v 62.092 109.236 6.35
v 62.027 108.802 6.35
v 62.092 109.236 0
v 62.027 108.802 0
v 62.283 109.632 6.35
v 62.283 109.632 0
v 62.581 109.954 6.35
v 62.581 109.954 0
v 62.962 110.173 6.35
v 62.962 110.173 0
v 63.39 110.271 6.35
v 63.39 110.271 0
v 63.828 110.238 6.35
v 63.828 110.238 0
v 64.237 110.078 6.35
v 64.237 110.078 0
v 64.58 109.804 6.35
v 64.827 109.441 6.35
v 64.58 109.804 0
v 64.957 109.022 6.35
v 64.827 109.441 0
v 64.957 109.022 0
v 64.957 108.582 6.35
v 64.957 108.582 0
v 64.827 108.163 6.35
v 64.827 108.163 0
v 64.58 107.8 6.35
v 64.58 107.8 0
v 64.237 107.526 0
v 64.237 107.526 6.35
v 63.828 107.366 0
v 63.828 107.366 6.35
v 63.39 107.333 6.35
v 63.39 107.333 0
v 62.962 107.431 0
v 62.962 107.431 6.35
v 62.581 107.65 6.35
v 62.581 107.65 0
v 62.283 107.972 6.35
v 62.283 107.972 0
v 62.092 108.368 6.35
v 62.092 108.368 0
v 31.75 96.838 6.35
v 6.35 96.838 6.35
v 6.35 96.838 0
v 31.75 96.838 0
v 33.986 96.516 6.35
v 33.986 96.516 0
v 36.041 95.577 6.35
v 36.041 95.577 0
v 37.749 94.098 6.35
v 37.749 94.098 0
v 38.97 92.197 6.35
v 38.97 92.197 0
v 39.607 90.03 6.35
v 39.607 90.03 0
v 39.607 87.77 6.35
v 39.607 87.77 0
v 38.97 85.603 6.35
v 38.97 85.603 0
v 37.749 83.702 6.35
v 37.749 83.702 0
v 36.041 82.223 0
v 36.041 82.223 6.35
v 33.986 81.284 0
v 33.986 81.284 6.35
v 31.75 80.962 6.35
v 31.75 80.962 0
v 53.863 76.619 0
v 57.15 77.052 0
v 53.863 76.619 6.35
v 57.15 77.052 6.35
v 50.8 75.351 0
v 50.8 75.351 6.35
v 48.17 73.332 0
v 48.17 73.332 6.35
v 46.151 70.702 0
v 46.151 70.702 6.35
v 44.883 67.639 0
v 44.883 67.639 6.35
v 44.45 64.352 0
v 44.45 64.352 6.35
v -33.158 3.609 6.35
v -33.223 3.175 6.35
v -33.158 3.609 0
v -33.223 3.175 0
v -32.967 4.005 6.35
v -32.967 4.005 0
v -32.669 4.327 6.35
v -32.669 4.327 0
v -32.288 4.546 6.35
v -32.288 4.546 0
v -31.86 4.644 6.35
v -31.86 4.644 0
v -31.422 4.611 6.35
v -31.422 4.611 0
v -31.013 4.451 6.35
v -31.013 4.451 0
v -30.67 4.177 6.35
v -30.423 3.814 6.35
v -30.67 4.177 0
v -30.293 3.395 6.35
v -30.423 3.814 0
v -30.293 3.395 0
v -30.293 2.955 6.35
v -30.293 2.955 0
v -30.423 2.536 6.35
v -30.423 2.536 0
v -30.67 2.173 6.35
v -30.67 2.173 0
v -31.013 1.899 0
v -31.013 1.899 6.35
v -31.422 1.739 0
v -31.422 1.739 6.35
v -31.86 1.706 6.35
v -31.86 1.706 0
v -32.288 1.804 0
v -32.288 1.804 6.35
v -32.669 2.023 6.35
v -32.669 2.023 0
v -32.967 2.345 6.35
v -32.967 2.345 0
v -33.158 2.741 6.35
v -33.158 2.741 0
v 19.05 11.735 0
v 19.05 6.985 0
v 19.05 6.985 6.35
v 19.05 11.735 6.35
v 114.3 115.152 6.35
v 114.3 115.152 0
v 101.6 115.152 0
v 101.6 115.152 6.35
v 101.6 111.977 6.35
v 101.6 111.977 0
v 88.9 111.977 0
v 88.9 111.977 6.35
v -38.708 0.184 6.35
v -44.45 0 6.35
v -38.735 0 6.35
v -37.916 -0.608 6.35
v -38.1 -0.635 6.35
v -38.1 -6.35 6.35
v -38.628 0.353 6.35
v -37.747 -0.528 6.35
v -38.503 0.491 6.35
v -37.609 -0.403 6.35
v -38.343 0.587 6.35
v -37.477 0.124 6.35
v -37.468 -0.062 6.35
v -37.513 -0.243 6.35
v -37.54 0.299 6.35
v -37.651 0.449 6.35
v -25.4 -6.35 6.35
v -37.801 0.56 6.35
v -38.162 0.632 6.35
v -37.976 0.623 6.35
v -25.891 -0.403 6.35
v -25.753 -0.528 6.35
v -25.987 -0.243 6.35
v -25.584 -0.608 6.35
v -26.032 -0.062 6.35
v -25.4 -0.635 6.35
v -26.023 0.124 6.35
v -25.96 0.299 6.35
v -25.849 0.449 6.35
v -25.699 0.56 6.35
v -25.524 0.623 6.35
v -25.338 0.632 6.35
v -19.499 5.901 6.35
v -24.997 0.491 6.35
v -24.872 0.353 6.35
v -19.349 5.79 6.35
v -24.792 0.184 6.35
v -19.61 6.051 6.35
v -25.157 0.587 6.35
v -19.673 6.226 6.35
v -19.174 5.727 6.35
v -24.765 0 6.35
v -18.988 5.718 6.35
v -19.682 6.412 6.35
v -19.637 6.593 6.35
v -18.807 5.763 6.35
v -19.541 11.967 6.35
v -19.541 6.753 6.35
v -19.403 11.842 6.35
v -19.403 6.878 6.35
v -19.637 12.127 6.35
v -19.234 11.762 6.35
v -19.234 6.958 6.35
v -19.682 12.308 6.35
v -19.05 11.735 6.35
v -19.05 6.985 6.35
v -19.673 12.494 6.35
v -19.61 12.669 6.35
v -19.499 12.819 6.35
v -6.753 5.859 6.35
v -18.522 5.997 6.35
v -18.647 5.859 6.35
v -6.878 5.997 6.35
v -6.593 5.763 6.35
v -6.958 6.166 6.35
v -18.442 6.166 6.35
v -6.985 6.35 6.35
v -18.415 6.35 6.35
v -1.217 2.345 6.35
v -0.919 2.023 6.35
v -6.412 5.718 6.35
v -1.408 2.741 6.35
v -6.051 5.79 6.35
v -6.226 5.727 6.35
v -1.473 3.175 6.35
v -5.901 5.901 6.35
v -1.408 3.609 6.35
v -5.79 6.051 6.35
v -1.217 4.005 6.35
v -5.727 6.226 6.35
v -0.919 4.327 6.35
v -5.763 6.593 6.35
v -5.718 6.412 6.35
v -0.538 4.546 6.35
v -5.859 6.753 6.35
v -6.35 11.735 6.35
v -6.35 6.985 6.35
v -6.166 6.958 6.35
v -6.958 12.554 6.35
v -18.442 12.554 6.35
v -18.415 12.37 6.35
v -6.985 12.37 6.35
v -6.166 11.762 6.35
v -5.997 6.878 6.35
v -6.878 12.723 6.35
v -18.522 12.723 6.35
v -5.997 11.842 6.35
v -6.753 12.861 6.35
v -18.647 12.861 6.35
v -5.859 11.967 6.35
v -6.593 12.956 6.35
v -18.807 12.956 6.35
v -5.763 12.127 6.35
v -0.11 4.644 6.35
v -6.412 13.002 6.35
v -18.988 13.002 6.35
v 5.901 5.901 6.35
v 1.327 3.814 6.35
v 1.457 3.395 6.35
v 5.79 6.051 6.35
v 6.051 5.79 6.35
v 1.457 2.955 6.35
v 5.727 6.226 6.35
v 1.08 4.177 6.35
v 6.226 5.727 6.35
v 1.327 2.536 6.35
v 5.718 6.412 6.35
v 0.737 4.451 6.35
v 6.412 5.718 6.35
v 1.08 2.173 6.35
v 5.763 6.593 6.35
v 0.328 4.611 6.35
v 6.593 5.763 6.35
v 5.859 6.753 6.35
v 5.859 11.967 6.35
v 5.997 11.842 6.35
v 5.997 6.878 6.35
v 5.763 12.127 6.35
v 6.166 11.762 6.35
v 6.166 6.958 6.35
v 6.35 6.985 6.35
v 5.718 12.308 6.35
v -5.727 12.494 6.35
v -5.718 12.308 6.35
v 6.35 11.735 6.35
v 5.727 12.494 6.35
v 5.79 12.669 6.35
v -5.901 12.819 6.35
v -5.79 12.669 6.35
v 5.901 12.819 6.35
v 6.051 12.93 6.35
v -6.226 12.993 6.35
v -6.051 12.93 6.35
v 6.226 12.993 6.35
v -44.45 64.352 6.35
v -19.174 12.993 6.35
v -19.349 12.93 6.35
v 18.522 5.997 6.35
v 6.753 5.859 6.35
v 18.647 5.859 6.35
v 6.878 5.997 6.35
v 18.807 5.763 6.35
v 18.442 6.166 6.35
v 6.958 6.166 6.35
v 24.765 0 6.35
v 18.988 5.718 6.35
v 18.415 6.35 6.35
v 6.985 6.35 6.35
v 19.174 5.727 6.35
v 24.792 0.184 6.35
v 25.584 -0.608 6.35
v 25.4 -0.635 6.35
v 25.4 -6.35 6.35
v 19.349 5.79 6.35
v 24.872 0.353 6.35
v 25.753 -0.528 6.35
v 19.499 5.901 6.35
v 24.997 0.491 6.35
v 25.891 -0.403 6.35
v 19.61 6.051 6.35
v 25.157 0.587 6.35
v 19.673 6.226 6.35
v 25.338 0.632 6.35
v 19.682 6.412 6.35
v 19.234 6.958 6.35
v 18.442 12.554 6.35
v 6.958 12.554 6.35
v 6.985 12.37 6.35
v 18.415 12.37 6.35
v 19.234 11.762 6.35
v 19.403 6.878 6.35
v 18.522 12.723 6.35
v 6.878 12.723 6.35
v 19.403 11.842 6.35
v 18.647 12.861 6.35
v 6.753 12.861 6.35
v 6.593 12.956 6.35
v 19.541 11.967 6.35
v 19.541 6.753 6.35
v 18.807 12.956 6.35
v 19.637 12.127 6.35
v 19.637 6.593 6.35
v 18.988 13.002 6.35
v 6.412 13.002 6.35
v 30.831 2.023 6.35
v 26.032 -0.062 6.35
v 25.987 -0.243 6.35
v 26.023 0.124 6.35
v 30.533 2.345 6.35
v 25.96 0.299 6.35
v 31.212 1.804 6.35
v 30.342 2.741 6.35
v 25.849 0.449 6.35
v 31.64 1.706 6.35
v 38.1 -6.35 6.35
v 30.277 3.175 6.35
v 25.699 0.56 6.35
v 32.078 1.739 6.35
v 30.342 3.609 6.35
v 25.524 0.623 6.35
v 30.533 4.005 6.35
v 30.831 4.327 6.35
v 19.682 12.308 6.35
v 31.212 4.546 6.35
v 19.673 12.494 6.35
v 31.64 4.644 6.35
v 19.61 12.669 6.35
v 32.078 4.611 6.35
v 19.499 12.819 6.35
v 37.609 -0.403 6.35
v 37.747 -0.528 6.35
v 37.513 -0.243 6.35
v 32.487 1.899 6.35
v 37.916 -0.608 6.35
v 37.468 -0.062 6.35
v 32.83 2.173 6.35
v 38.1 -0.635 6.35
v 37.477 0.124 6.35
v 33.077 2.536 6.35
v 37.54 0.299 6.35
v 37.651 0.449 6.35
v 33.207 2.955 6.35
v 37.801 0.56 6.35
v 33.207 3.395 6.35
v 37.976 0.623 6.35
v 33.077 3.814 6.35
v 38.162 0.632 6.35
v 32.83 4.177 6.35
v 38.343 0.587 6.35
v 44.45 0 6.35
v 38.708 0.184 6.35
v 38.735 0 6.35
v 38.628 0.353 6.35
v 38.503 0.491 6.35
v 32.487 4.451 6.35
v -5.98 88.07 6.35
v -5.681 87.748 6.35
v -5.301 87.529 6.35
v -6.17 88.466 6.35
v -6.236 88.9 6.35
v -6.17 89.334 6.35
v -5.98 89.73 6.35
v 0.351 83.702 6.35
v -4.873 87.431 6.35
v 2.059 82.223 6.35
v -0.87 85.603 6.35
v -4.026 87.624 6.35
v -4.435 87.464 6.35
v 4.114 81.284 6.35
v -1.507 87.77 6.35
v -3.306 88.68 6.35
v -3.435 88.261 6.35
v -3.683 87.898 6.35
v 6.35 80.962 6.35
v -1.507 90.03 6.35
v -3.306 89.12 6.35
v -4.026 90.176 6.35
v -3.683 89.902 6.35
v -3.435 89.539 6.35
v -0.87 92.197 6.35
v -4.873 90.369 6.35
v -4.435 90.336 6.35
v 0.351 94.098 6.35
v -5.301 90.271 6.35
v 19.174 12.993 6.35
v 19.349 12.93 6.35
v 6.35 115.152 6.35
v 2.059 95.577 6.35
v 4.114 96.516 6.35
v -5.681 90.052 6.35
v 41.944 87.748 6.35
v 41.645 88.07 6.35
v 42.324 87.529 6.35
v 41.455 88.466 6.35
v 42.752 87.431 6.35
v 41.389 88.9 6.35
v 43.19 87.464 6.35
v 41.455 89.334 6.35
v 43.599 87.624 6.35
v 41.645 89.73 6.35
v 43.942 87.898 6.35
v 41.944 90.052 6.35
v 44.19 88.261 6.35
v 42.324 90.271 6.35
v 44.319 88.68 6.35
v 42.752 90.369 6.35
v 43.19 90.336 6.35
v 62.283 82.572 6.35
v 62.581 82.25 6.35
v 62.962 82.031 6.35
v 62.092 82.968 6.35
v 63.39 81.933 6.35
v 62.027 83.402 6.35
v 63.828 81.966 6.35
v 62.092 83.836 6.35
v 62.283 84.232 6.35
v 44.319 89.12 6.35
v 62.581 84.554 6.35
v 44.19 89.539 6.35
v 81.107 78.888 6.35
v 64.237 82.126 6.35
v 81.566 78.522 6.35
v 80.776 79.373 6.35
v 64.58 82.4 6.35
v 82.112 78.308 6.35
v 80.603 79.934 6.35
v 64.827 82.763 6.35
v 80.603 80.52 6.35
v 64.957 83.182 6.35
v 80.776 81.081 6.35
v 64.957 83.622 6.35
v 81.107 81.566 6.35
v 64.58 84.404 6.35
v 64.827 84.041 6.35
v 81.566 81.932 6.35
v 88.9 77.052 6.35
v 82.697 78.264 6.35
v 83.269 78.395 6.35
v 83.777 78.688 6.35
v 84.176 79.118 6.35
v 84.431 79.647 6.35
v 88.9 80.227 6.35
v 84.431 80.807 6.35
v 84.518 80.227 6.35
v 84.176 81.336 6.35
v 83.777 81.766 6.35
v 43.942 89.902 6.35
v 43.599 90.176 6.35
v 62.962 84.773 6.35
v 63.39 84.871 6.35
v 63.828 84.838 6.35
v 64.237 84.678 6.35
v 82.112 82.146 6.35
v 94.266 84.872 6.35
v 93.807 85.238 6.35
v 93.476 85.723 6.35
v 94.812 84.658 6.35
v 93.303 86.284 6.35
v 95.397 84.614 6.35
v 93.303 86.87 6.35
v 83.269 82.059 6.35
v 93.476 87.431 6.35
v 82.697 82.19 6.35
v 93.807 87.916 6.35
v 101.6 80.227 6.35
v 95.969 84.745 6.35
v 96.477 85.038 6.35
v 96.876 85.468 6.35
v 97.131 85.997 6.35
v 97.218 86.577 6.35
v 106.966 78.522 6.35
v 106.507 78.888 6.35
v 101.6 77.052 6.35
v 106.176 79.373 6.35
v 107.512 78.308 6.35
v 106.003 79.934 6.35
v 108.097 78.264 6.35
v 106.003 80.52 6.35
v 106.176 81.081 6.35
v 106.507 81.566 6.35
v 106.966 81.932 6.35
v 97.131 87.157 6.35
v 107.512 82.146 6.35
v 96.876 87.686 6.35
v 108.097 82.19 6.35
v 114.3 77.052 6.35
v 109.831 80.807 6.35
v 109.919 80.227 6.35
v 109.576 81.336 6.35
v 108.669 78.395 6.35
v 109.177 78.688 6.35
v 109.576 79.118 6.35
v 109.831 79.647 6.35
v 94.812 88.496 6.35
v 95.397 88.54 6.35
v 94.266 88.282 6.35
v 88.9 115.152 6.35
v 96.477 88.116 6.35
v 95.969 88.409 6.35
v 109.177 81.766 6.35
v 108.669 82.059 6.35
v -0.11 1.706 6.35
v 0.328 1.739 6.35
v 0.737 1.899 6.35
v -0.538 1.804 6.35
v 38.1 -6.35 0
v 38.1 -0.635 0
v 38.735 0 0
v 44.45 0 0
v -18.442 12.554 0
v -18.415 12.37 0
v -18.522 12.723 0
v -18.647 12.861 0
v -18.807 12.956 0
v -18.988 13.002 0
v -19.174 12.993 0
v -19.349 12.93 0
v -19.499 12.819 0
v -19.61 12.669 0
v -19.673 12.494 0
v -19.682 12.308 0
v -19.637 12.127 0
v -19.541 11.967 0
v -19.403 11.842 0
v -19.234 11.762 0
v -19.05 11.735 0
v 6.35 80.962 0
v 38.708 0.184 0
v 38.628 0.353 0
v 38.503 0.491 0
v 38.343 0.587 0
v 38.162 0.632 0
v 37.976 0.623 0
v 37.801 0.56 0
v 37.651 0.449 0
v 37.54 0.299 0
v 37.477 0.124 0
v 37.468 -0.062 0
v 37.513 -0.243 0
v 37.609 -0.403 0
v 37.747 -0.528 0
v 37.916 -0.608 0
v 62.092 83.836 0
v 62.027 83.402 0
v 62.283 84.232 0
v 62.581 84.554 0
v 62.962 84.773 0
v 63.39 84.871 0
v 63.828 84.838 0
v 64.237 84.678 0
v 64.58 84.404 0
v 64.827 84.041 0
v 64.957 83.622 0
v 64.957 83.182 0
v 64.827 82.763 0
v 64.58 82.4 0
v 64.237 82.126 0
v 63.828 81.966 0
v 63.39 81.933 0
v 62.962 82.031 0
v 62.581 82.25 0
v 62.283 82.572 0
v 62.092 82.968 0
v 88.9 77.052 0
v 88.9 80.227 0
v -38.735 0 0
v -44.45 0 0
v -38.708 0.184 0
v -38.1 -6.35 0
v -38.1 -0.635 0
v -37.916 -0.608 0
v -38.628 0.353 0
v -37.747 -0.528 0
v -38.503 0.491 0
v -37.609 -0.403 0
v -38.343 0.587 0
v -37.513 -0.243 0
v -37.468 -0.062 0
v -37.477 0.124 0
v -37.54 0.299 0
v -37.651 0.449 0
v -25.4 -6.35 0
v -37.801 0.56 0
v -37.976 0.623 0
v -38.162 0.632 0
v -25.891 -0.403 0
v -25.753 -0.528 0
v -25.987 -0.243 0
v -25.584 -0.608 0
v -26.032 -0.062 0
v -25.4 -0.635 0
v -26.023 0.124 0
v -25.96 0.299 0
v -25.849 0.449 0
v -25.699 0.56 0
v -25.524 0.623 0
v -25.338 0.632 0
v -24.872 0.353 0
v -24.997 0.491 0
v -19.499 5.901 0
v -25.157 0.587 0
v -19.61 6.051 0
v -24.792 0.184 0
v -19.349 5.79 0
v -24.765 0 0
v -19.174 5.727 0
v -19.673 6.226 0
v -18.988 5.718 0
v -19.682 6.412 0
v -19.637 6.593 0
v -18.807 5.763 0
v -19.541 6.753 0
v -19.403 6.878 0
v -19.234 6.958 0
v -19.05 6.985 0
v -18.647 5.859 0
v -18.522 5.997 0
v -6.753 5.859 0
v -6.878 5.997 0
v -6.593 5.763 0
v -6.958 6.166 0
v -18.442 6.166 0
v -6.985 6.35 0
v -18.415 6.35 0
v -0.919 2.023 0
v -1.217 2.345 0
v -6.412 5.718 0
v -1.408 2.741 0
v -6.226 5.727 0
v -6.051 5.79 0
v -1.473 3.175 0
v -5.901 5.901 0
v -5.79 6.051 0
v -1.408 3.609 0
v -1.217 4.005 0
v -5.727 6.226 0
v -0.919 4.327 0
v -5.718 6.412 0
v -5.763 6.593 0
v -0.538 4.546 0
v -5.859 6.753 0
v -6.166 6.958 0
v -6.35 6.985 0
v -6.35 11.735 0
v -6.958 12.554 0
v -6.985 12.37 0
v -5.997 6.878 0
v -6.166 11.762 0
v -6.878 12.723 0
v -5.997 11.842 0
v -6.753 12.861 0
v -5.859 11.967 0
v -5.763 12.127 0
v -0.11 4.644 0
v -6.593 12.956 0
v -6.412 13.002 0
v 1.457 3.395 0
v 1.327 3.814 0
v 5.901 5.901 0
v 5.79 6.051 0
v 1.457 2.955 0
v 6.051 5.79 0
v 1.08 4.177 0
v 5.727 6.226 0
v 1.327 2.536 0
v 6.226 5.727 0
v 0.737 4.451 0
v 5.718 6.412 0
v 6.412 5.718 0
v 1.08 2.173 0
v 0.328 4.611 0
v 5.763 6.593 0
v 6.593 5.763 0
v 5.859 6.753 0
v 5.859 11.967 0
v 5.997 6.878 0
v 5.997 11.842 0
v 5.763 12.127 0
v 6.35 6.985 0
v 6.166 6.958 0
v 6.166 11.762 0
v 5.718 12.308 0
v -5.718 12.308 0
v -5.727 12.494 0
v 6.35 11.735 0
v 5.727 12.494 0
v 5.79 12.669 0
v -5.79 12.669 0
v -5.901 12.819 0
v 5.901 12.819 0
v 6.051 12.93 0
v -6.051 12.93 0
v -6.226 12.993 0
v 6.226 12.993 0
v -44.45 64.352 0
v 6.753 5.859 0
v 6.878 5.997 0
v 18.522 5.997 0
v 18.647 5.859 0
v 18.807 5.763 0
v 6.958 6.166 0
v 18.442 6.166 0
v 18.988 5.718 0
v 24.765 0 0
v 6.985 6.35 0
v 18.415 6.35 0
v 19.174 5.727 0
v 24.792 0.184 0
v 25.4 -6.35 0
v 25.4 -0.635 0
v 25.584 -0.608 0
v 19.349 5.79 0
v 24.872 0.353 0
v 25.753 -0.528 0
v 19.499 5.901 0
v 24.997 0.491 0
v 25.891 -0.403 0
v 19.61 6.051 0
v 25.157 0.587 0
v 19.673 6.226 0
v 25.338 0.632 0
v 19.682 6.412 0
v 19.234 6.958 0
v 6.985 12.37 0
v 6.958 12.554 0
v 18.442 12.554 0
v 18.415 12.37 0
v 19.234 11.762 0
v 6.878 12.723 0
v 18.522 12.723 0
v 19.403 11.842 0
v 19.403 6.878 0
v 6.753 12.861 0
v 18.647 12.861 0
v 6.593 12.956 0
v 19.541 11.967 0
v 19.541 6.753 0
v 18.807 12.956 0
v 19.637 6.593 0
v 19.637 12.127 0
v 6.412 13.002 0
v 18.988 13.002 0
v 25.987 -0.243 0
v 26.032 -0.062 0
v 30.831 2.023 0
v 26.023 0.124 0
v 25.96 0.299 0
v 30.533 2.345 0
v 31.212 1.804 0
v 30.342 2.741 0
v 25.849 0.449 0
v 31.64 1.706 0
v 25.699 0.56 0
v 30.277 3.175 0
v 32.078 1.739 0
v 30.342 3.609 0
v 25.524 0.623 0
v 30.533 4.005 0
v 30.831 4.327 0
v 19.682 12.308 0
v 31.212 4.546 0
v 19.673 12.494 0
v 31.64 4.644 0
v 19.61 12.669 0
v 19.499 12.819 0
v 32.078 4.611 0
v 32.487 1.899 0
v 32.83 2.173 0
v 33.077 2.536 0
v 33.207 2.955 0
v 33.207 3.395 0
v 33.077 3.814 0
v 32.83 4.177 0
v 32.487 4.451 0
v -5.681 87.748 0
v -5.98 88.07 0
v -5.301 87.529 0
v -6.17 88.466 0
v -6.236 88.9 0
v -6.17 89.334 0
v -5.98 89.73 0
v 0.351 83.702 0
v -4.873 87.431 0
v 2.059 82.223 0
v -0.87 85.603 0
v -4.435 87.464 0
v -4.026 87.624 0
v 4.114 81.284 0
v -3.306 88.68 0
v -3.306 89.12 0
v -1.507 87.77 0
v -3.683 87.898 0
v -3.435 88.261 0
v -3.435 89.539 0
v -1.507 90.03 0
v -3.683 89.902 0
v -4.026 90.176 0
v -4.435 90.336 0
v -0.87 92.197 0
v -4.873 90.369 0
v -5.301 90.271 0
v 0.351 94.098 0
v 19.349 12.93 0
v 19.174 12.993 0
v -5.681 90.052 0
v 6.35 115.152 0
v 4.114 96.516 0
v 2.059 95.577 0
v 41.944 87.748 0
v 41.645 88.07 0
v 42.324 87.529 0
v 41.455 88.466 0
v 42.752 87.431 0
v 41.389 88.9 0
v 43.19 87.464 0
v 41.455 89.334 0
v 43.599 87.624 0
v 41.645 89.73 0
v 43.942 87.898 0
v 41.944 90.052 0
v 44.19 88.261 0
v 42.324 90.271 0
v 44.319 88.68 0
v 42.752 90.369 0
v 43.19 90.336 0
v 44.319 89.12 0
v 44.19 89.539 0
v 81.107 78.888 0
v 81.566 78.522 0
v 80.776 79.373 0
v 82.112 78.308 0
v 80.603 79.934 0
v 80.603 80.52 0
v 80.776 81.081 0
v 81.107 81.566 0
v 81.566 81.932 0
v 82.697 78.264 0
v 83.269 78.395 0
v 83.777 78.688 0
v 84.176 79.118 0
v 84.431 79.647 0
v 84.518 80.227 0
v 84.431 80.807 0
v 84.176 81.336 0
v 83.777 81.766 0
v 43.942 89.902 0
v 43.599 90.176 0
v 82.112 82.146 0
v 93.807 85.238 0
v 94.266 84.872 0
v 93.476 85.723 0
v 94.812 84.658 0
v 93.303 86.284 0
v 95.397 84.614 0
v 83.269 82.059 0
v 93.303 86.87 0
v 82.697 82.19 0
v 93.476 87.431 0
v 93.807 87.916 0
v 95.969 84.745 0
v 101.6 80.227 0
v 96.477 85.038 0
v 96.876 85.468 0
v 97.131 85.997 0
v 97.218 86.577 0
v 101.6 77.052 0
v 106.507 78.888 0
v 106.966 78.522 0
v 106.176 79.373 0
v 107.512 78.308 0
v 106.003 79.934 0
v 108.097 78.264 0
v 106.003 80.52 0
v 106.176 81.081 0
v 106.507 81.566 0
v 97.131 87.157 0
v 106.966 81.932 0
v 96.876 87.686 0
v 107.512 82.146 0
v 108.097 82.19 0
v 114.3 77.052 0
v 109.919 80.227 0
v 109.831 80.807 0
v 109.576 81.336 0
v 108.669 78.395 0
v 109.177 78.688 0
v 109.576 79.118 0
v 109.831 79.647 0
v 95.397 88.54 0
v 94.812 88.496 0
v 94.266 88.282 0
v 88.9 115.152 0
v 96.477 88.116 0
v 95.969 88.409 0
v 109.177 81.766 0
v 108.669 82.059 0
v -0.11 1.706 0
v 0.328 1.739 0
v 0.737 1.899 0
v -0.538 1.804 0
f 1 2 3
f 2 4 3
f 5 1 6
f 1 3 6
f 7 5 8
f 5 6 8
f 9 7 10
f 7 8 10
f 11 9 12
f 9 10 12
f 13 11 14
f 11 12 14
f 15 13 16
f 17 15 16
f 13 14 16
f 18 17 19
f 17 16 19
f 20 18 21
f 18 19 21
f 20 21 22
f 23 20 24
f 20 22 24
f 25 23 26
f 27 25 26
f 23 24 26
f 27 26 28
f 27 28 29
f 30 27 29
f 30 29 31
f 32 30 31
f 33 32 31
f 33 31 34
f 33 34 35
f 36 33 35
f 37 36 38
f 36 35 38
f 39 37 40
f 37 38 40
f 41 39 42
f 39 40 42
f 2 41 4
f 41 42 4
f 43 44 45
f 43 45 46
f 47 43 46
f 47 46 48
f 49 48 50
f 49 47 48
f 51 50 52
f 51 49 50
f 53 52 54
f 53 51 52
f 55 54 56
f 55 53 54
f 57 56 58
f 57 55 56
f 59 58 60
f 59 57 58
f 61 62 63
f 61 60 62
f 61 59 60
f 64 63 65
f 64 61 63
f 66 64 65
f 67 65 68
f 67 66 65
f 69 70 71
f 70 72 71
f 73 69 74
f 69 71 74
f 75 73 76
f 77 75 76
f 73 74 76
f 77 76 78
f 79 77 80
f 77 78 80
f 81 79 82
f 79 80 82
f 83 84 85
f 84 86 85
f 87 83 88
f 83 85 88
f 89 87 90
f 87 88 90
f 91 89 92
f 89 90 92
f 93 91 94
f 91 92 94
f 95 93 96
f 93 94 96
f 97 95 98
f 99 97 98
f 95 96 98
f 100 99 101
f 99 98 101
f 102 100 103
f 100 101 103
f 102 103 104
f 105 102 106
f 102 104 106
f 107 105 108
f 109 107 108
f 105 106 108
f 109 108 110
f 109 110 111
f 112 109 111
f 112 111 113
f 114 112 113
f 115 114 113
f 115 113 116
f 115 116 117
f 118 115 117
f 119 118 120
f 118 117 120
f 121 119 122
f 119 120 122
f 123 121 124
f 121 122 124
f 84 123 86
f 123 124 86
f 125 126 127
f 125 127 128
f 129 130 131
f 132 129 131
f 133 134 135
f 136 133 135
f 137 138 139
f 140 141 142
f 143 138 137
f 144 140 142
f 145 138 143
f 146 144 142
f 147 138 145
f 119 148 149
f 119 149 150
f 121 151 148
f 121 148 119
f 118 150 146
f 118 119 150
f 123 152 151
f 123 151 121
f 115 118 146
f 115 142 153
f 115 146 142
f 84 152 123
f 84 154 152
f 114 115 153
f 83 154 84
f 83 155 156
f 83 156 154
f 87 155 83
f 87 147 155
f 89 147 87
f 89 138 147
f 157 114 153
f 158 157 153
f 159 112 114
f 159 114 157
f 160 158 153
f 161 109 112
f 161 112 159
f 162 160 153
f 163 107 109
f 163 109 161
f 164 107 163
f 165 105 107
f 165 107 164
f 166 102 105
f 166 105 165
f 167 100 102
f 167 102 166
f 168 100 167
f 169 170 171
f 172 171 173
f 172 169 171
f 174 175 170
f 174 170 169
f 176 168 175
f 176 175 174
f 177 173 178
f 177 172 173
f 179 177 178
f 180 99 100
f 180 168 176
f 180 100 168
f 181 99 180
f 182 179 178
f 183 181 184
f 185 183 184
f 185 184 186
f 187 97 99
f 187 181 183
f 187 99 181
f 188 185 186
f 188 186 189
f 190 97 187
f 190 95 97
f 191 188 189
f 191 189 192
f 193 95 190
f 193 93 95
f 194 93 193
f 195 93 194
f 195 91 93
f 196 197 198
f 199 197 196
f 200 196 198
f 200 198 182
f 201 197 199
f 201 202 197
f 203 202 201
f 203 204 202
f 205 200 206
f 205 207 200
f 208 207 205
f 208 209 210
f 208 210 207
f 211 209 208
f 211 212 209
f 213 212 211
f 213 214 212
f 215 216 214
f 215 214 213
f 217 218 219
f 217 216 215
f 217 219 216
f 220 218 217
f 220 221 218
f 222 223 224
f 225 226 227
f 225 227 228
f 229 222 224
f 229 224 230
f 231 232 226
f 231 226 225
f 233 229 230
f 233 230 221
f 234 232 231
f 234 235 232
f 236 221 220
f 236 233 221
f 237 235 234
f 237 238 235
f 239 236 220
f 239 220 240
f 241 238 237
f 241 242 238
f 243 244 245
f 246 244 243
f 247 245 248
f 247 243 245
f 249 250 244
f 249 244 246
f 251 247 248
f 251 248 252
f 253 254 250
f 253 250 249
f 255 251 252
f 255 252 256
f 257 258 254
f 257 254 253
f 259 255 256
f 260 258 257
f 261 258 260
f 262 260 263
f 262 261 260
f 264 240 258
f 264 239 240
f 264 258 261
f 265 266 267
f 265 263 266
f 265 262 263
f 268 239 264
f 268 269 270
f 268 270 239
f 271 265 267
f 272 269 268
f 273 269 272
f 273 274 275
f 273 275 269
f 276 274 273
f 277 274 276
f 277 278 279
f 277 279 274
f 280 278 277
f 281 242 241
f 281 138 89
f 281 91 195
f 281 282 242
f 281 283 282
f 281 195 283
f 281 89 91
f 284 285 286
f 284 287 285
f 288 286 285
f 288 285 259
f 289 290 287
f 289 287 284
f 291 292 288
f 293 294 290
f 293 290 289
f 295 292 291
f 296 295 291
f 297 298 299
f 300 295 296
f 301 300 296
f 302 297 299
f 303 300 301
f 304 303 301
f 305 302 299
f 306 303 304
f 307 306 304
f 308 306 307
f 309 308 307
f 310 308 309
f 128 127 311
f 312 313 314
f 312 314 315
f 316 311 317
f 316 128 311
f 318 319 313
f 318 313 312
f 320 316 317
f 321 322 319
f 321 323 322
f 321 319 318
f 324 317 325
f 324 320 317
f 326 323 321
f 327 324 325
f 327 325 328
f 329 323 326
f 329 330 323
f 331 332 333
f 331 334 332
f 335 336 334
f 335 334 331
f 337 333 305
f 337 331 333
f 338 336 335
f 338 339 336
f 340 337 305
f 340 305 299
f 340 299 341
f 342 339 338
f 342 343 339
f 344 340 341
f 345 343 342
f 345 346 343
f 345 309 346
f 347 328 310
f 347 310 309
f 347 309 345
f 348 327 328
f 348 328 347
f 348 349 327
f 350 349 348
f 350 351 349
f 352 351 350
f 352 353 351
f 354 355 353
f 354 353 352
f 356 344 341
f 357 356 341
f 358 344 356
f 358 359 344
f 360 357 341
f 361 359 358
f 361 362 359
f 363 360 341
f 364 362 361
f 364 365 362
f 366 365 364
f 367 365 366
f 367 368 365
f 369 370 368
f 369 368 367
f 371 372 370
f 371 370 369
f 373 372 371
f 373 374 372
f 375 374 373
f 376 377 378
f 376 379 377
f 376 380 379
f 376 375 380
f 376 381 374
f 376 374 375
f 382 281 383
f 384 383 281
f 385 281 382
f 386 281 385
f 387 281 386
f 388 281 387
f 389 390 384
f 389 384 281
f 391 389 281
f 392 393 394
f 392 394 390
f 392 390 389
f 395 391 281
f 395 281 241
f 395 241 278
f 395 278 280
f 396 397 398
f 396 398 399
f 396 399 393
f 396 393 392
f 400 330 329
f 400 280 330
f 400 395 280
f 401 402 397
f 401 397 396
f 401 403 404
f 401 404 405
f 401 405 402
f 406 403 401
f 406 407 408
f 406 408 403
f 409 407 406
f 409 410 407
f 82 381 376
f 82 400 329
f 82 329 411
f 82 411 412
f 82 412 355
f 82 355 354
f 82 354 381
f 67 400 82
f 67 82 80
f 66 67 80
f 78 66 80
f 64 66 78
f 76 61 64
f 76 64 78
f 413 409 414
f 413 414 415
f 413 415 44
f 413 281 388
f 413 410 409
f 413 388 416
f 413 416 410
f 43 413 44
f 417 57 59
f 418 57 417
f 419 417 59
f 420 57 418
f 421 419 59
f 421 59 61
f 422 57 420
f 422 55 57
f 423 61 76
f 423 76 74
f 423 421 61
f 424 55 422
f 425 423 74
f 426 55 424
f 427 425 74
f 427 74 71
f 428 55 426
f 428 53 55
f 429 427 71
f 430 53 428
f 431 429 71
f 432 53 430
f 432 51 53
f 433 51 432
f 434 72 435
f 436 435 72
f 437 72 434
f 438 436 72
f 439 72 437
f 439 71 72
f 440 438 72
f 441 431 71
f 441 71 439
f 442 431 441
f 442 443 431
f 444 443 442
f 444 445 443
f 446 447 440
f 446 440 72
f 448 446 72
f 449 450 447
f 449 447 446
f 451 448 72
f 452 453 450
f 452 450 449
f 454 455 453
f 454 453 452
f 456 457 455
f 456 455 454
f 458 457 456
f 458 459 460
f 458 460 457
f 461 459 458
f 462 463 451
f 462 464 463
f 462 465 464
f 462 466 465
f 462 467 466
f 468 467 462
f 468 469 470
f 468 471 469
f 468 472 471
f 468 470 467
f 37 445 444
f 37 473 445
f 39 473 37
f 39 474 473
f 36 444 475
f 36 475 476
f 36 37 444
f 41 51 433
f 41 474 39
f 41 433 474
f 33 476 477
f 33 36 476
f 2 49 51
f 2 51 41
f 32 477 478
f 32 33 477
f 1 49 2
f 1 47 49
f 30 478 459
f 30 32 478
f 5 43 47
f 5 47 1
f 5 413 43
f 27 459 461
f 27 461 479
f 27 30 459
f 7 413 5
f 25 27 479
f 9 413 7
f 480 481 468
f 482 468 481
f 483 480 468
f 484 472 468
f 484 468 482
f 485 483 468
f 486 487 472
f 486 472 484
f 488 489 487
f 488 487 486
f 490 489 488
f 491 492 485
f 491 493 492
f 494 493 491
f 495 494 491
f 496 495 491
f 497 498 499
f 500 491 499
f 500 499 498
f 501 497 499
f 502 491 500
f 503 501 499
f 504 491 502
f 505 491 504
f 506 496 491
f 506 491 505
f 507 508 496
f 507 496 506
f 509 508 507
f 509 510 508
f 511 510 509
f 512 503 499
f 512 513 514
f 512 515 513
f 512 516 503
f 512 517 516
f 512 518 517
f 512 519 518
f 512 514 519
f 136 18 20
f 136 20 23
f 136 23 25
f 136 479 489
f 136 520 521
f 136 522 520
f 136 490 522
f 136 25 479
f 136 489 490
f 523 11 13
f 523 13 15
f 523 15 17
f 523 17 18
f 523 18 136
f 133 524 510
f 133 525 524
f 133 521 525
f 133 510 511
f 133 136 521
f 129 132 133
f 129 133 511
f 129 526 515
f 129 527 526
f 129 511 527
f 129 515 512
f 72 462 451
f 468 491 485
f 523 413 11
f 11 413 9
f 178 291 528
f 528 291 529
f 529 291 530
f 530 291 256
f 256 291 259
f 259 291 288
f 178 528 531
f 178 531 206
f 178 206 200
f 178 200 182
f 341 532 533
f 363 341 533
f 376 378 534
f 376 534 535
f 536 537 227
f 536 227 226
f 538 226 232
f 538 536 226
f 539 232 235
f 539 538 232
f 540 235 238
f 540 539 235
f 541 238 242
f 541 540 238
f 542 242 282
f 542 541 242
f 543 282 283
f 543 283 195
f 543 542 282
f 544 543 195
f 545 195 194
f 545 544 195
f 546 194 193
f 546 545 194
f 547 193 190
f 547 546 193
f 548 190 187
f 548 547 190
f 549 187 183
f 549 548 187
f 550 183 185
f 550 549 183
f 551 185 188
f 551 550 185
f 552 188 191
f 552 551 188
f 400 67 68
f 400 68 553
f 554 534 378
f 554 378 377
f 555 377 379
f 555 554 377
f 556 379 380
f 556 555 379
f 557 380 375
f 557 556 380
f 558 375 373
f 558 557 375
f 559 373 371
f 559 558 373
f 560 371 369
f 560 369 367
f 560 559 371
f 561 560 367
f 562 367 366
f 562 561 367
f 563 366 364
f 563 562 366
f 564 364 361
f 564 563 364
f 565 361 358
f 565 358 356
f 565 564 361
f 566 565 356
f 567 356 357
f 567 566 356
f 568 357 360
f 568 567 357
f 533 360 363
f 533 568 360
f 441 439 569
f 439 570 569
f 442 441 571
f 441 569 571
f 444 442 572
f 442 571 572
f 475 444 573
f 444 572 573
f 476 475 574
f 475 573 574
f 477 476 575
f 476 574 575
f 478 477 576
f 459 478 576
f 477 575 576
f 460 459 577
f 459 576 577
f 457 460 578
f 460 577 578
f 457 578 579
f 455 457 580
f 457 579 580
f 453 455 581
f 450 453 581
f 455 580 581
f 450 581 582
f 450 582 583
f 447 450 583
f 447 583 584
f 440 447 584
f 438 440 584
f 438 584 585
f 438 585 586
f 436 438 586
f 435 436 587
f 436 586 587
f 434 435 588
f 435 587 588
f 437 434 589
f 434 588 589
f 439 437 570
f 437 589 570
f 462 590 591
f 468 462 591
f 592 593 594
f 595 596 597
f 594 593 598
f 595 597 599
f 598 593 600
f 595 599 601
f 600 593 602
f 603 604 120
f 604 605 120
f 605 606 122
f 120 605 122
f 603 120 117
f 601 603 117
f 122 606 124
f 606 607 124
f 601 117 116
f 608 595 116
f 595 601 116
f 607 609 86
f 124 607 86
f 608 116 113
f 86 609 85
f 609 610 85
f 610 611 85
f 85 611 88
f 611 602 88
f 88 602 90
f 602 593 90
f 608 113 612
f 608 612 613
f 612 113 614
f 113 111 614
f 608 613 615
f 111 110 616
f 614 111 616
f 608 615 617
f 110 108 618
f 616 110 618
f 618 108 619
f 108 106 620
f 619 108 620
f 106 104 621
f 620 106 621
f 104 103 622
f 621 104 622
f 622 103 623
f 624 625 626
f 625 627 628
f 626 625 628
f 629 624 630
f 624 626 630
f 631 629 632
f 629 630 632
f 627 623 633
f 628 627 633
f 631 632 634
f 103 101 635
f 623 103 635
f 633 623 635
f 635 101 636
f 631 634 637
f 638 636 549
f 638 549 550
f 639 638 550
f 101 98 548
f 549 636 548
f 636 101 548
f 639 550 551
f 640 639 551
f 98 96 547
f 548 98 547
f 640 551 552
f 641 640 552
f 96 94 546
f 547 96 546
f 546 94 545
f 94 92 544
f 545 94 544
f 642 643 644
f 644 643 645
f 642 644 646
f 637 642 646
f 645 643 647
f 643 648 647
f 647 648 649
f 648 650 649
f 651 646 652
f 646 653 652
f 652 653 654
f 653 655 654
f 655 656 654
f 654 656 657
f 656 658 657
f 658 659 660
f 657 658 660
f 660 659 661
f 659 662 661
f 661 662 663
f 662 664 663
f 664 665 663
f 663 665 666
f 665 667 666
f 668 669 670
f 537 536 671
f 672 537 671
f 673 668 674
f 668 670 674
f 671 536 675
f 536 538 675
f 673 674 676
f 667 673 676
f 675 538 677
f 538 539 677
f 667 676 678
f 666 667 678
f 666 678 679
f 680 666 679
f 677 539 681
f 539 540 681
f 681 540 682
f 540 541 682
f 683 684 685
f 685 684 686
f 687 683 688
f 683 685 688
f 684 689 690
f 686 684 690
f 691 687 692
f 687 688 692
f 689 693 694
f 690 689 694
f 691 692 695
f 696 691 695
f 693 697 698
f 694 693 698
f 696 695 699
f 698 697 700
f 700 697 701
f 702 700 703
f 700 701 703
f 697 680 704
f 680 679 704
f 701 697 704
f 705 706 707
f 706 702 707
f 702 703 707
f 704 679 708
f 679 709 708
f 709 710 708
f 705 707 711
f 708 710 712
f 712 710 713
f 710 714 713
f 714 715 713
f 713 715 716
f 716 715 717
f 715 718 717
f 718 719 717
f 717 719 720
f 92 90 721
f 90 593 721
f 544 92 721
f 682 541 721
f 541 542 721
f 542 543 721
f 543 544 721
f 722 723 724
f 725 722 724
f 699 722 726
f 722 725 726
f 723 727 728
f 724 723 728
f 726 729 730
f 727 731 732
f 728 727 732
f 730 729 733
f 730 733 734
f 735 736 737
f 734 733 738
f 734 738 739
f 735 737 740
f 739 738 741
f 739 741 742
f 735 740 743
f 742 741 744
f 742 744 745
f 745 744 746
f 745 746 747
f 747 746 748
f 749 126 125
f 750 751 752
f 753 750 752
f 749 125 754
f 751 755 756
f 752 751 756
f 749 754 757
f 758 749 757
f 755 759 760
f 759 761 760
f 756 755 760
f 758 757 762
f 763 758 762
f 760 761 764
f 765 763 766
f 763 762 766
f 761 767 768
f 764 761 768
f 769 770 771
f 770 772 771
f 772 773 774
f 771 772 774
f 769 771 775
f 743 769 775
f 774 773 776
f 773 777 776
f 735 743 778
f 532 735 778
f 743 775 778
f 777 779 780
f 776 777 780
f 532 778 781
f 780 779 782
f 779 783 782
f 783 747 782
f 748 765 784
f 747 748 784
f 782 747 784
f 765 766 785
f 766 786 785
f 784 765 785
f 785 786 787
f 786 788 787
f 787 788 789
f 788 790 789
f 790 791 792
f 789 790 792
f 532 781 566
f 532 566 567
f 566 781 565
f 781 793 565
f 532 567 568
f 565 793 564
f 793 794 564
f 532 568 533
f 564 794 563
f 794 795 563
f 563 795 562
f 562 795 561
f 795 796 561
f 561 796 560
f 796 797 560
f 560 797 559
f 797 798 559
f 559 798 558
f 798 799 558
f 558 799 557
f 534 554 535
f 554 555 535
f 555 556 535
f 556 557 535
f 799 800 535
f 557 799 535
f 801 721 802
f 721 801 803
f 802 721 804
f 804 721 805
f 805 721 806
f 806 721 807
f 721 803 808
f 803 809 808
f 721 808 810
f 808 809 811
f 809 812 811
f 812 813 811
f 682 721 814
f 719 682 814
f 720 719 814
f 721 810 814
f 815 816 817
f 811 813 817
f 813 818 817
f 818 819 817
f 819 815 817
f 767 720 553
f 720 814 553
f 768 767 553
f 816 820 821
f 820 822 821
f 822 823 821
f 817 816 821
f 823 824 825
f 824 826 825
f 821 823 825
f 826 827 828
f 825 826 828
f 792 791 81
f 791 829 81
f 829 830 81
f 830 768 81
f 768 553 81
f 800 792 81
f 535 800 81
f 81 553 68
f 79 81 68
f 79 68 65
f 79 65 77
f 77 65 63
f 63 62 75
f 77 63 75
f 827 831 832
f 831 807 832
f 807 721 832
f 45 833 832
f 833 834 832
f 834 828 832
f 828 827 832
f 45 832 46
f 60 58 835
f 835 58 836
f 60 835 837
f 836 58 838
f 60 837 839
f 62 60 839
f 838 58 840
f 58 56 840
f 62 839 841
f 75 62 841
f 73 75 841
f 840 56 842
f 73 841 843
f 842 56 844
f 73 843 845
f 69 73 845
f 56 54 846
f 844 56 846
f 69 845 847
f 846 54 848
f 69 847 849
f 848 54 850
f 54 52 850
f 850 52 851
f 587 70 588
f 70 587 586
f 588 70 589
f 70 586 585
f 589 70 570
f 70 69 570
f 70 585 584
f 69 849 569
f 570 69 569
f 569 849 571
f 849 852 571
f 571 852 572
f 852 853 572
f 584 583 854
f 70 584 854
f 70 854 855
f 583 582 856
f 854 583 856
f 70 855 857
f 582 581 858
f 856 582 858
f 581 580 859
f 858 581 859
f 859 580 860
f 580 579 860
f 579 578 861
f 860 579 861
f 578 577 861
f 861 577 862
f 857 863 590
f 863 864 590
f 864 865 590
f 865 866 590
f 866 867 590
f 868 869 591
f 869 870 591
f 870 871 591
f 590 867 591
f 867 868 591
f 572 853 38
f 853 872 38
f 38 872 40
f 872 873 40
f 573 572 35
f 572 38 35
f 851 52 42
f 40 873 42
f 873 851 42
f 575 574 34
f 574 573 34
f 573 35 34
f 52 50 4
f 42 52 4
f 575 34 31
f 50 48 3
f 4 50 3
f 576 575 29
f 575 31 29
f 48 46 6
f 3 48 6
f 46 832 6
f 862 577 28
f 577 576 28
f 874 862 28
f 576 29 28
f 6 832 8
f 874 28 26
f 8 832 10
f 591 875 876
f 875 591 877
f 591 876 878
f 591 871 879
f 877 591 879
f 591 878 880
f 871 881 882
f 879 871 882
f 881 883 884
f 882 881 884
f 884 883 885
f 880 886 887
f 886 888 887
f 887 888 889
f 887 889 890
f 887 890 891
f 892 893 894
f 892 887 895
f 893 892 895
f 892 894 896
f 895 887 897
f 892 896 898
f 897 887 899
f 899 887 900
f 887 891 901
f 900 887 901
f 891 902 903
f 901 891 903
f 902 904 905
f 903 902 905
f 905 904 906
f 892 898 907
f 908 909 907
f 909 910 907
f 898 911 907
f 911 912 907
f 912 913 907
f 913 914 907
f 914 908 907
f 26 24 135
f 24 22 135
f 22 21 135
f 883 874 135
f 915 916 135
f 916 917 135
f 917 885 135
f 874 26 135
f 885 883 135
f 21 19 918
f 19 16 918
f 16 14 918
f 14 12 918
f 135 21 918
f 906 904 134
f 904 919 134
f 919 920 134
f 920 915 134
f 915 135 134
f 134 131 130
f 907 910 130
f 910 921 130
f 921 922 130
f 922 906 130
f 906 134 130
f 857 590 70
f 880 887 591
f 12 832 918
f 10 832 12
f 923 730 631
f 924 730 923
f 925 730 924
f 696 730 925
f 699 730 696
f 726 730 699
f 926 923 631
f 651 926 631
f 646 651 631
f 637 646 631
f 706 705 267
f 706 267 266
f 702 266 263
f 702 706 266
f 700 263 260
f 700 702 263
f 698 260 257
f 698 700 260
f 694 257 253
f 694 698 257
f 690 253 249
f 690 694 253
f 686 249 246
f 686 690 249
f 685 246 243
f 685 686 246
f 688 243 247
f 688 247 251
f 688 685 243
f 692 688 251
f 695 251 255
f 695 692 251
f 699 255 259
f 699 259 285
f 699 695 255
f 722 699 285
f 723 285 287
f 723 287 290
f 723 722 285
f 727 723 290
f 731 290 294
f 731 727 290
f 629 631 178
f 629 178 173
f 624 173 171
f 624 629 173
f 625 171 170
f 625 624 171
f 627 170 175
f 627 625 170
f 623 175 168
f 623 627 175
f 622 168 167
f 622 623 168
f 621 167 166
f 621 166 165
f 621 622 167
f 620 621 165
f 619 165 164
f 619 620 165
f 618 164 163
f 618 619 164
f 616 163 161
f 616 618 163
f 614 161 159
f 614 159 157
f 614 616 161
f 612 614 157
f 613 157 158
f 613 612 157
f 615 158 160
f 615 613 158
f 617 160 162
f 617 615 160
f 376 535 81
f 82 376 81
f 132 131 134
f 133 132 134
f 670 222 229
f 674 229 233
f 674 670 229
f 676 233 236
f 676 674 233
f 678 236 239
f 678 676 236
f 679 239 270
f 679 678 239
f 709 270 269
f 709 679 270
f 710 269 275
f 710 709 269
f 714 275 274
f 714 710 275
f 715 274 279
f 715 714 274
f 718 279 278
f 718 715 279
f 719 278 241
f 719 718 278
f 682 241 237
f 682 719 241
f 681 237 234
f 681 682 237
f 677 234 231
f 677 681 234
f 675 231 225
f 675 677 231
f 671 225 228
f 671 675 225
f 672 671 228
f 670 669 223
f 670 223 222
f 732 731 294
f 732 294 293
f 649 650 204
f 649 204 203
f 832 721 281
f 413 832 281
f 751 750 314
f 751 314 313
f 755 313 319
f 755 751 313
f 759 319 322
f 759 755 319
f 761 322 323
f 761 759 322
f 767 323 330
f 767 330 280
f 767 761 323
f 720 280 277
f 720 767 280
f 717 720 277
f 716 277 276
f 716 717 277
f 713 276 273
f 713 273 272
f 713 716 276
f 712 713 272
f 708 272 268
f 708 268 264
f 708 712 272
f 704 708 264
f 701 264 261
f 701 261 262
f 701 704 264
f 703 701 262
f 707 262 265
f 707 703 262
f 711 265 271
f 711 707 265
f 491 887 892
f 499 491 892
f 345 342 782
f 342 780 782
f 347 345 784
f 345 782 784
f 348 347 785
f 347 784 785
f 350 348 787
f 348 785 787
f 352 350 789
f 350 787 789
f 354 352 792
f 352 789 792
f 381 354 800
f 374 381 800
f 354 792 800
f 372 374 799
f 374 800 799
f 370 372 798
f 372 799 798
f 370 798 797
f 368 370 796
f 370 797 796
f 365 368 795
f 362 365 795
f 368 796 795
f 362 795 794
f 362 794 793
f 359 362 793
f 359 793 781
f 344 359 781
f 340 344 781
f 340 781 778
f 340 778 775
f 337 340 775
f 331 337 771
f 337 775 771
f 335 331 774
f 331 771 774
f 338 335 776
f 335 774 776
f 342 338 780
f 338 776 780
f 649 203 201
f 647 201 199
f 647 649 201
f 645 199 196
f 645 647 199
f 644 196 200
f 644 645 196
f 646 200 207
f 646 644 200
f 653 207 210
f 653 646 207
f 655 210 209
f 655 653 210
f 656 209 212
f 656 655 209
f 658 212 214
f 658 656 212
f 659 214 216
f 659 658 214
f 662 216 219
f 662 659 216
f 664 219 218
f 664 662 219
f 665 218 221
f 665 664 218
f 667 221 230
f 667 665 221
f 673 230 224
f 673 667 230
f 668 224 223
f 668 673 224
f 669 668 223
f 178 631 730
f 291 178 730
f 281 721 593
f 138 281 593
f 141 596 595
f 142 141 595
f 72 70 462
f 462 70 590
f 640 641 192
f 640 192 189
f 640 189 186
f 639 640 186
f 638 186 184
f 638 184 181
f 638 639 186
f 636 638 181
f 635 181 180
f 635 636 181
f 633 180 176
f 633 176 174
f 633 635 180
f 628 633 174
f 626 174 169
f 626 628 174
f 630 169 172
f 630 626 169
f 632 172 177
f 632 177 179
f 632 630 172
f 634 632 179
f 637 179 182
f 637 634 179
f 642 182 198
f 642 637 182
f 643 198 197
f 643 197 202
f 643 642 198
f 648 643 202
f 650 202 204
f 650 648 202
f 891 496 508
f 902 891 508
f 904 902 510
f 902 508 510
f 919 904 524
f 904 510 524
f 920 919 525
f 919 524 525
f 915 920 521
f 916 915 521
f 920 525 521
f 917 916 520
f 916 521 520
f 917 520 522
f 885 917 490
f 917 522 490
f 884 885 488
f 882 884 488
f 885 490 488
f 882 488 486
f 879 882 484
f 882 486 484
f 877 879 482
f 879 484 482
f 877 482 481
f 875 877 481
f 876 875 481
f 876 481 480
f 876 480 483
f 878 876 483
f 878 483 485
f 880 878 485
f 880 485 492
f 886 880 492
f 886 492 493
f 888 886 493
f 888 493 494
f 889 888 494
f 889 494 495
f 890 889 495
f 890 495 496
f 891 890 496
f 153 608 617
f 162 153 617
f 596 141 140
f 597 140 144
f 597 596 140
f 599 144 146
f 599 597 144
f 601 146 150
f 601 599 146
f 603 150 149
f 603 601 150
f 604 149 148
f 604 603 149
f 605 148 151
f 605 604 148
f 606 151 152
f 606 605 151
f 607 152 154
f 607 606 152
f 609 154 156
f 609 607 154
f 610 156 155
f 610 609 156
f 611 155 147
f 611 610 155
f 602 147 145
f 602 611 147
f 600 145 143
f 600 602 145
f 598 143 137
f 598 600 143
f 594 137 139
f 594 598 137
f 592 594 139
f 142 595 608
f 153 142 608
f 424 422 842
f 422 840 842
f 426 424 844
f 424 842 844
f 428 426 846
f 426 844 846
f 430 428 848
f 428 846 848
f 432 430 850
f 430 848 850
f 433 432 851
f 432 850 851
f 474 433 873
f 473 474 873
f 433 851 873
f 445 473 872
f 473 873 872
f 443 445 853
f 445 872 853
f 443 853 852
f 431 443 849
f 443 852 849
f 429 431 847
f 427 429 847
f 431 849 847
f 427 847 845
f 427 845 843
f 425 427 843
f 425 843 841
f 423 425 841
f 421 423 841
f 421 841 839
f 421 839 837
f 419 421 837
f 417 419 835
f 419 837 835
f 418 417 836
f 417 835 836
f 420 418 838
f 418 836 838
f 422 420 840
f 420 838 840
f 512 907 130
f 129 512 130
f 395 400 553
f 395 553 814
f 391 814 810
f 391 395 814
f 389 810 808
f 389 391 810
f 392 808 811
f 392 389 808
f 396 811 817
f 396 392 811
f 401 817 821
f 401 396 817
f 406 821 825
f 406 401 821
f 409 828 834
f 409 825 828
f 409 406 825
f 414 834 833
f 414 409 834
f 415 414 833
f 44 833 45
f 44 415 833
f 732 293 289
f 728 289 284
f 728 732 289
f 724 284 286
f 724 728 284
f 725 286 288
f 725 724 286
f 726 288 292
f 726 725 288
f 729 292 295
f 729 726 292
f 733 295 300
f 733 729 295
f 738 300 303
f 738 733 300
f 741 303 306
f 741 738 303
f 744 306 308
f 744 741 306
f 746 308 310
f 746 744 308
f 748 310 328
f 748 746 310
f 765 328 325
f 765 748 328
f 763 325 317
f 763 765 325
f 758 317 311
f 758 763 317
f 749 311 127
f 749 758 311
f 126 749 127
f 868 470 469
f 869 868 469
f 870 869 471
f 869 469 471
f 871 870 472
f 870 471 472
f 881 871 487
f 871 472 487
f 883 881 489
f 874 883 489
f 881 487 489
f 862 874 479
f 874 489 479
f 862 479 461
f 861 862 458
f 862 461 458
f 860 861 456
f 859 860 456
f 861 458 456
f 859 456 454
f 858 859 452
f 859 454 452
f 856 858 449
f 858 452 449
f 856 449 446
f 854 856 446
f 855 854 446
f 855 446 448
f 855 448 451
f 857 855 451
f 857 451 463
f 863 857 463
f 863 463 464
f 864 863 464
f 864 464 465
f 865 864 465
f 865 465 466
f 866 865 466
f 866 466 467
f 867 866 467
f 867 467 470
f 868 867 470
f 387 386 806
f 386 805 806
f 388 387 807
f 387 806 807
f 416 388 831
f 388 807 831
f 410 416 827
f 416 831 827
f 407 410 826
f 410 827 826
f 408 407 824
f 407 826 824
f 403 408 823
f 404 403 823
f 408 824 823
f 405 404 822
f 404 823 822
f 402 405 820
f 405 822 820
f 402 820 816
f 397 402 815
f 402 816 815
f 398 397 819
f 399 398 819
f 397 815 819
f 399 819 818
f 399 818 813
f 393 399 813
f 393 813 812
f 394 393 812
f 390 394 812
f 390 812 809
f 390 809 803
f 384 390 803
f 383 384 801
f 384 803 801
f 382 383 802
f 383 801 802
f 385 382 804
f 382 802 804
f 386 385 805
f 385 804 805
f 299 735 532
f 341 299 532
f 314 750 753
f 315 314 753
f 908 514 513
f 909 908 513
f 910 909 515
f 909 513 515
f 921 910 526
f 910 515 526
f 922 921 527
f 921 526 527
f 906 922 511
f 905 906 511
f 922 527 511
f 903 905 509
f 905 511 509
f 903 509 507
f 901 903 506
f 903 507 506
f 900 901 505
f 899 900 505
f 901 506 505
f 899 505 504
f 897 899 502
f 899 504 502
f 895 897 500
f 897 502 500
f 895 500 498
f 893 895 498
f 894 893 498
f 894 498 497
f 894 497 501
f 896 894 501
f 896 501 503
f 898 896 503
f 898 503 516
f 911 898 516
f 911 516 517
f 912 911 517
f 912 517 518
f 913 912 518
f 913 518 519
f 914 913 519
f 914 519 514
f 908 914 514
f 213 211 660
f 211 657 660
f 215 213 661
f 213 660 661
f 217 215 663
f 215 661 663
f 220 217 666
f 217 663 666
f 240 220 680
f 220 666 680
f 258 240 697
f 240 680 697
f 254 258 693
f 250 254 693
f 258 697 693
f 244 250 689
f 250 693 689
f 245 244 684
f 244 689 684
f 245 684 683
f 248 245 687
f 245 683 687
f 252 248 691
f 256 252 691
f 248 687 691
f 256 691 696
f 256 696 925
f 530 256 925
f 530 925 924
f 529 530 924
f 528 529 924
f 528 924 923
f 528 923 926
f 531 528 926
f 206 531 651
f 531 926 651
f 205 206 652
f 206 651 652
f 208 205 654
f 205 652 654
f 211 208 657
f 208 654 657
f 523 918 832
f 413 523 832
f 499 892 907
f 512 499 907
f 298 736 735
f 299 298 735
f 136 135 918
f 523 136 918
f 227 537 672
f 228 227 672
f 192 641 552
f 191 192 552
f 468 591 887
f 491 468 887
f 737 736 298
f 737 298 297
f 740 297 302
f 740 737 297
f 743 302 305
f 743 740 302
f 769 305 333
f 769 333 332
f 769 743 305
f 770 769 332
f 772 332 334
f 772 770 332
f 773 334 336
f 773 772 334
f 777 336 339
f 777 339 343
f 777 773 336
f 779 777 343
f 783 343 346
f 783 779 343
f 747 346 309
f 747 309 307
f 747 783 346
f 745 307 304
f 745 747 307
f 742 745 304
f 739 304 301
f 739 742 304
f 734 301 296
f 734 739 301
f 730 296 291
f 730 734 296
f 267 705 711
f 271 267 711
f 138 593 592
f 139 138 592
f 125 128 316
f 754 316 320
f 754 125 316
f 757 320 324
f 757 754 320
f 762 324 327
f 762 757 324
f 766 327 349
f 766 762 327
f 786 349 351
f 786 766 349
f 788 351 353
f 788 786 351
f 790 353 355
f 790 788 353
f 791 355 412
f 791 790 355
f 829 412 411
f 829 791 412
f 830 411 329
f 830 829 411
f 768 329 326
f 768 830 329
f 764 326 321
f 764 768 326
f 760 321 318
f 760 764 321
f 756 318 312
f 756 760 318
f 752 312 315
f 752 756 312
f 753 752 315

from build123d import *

# Parameters (mm, degrees)
SKETCH1_W                 = 12.7
SKETCH1_H                 = 6.0198
BOSS_EXTRUDE1_DEPTH       = 6.35
SKETCH13_R                = 0.635
CUT_EXTRUDE2_DEPTH        = 6.35
CHAMFER1_SIZE             = 50.8
FILLET2_R                 = 12.7
F_4_CLEARANCE_HOLE1_D     = 2.9464
F_4_CLEARANCE_HOLE1_DEPTH = 6.35
F_4_CLEARANCE_HOLE1_TIP   = 0.885187864
CUT_EXTRUDE3_REACH        = 164.372
SKETCH14_R                = 1.9685
F_4_CLEARANCE_HOLE2_D     = 2.9464
F_4_CLEARANCE_HOLE2_DEPTH = 6.35
F_4_CLEARANCE_HOLE2_TIP   = 0.885187864
CUT_EXTRUDE4_REACH        = 164.372
F_4_CLEARANCE_HOLE3_D     = 2.9464
F_4_CLEARANCE_HOLE3_DEPTH = 6.35
F_4_CLEARANCE_HOLE3_TIP   = 0.885187864


with BuildPart() as part:
    # Sketch1 → Boss-Extrude1 (new body)
    with BuildSketch(Plane.XY):
        Polygon((-25.4, 0), (25.4, 0), (25.4, -6.35), (38.1, -6.35), (38.1, 0), (44.45, 0), (44.45, 77.052), (88.9, 77.052), (88.9, 80.227), (101.6, 80.227), (101.6, 77.052), (114.3, 77.052), (114.3, 115.152), (101.6, 115.152), (101.6, 111.977), (88.9, 111.977), (88.9, 115.152), (-44.45, 115.152), (-44.45, 0), (-38.1, 0), (-38.1, -6.35), (-25.4, -6.35), align=None)
        with Locations((12.7, 9.3599)):
            Rectangle(SKETCH1_W, SKETCH1_H, mode=Mode.SUBTRACT)
        with Locations((-12.7, 9.3599)):
            Rectangle(SKETCH1_W, SKETCH1_H, mode=Mode.SUBTRACT)
    extrude(amount=BOSS_EXTRUDE1_DEPTH)

    # Sketch13 → Cut-Extrude2 (cut)
    with BuildSketch(Plane.XY):
        with Locations((-19.05, 12.3698)):
            Circle(SKETCH13_R)
    cut_extrude2 = extrude(amount=CUT_EXTRUDE2_DEPTH, mode=Mode.SUBTRACT)

    # Sketch-Pattern1: Cut-Extrude2 at 11 more places
    with Locations((12.7, 0, 0), (12.7, -6.0198, 0), (0, -6.0198, 0), (25.4, 0, 0), (38.1, 0, 0), (38.1, -6.0198, 0), (25.4, -6.0198, 0), (57.15, -12.3698, 0), (44.45, -12.3698, 0), (-6.35, -12.3698, 0), (-19.05, -12.3698, 0)):
        add(cut_extrude2, mode=Mode.SUBTRACT)

    # Chamfer1
    chamfer1_edges = [part.edges().sort_by_distance(p)[0] for p in [
        (-44.45, 115.152, 3.175),
    ]]
    chamfer(chamfer1_edges, length=CHAMFER1_SIZE)

    # Fillet2
    fillet2_edges = [part.edges().sort_by_distance(p)[0] for p in [
        (44.45, 77.052, 3.175),
    ]]
    fillet(fillet2_edges, radius=FILLET2_R)

    # #4 Clearance Hole1
    with Locations(Plane.XY.offset(6.35)):
        with Locations((-31.75, 3.175), (31.75, 3.175), (0, 3.175)):
            Hole(F_4_CLEARANCE_HOLE1_D / 2, depth=F_4_CLEARANCE_HOLE1_DEPTH)
            with Locations((0, 0, -(F_4_CLEARANCE_HOLE1_DEPTH + F_4_CLEARANCE_HOLE1_TIP / 2))):  # 118° drill point
                Cone(0, F_4_CLEARANCE_HOLE1_D / 2, F_4_CLEARANCE_HOLE1_TIP, mode=Mode.SUBTRACT)

    # Sketch14 → Cut-Extrude3 (cut, up to next)
    with BuildSketch(Plane.XY.offset(6.35), mode=Mode.PRIVATE) as cut_extrude3_sk1:
        with Locations((95.25, 86.577)):
            Circle(SKETCH14_R)
    cut_extrude3_tool1 = extrude(cut_extrude3_sk1.sketch, amount=-CUT_EXTRUDE3_REACH, mode=Mode.PRIVATE) & part.part
    # Sketch14 → Cut-Extrude3 (cut, up to next)
    with BuildSketch(Plane.XY.offset(6.35), mode=Mode.PRIVATE) as cut_extrude3_sk2:
        with Locations((82.55, 80.227)):
            Circle(SKETCH14_R)
    cut_extrude3_tool2 = extrude(cut_extrude3_sk2.sketch, amount=-CUT_EXTRUDE3_REACH, mode=Mode.PRIVATE) & part.part
    # Sketch14 → Cut-Extrude3 (cut, up to next)
    with BuildSketch(Plane.XY.offset(6.35), mode=Mode.PRIVATE) as cut_extrude3_sk3:
        with Locations((107.95, 80.227)):
            Circle(SKETCH14_R)
    cut_extrude3_tool3 = extrude(cut_extrude3_sk3.sketch, amount=-CUT_EXTRUDE3_REACH, mode=Mode.PRIVATE) & part.part
    add(cut_extrude3_tool1.solids().sort_by_distance((95.25, 86.577, 6.35))[0], mode=Mode.SUBTRACT)
    add(cut_extrude3_tool2.solids().sort_by_distance((82.55, 80.227, 6.35))[0], mode=Mode.SUBTRACT)
    add(cut_extrude3_tool3.solids().sort_by_distance((107.95, 80.227, 6.35))[0], mode=Mode.SUBTRACT)

    # #4 Clearance Hole2
    with Locations(Plane.XY.offset(6.35)):
        with Locations((63.5, 83.402), (63.5, 108.802)):
            Hole(F_4_CLEARANCE_HOLE2_D / 2, depth=F_4_CLEARANCE_HOLE2_DEPTH)
            with Locations((0, 0, -(F_4_CLEARANCE_HOLE2_DEPTH + F_4_CLEARANCE_HOLE2_TIP / 2))):  # 118° drill point
                Cone(0, F_4_CLEARANCE_HOLE2_D / 2, F_4_CLEARANCE_HOLE2_TIP, mode=Mode.SUBTRACT)

    # Sketch18 → Cut-Extrude4 (cut, up to next)
    with BuildSketch(Plane.XY.offset(6.35), mode=Mode.PRIVATE) as cut_extrude4_sk1:
        with BuildLine():
            Line((6.35, 96.8375), (31.75, 96.8375))
            ThreePointArc((31.75, 96.8375), (39.6875, 88.9), (31.75, 80.9625))
            Line((31.75, 80.9625), (6.35, 80.9625))
            ThreePointArc((6.35, 80.9625), (-1.5875, 88.9), (6.35, 96.8375))
        make_face()
    cut_extrude4_tool1 = extrude(cut_extrude4_sk1.sketch, amount=-CUT_EXTRUDE4_REACH, mode=Mode.PRIVATE) & part.part
    add(cut_extrude4_tool1.solids().sort_by_distance((19.05, 88.9, 6.35))[0], mode=Mode.SUBTRACT)

    # #4 Clearance Hole3
    with Locations(Plane.XY.offset(6.35)):
        with Locations((-4.7625, 88.9), (42.8625, 88.9)):
            Hole(F_4_CLEARANCE_HOLE3_D / 2, depth=F_4_CLEARANCE_HOLE3_DEPTH)
            with Locations((0, 0, -(F_4_CLEARANCE_HOLE3_DEPTH + F_4_CLEARANCE_HOLE3_TIP / 2))):  # 118° drill point
                Cone(0, F_4_CLEARANCE_HOLE3_D / 2, F_4_CLEARANCE_HOLE3_TIP, mode=Mode.SUBTRACT)


solid = part.part
